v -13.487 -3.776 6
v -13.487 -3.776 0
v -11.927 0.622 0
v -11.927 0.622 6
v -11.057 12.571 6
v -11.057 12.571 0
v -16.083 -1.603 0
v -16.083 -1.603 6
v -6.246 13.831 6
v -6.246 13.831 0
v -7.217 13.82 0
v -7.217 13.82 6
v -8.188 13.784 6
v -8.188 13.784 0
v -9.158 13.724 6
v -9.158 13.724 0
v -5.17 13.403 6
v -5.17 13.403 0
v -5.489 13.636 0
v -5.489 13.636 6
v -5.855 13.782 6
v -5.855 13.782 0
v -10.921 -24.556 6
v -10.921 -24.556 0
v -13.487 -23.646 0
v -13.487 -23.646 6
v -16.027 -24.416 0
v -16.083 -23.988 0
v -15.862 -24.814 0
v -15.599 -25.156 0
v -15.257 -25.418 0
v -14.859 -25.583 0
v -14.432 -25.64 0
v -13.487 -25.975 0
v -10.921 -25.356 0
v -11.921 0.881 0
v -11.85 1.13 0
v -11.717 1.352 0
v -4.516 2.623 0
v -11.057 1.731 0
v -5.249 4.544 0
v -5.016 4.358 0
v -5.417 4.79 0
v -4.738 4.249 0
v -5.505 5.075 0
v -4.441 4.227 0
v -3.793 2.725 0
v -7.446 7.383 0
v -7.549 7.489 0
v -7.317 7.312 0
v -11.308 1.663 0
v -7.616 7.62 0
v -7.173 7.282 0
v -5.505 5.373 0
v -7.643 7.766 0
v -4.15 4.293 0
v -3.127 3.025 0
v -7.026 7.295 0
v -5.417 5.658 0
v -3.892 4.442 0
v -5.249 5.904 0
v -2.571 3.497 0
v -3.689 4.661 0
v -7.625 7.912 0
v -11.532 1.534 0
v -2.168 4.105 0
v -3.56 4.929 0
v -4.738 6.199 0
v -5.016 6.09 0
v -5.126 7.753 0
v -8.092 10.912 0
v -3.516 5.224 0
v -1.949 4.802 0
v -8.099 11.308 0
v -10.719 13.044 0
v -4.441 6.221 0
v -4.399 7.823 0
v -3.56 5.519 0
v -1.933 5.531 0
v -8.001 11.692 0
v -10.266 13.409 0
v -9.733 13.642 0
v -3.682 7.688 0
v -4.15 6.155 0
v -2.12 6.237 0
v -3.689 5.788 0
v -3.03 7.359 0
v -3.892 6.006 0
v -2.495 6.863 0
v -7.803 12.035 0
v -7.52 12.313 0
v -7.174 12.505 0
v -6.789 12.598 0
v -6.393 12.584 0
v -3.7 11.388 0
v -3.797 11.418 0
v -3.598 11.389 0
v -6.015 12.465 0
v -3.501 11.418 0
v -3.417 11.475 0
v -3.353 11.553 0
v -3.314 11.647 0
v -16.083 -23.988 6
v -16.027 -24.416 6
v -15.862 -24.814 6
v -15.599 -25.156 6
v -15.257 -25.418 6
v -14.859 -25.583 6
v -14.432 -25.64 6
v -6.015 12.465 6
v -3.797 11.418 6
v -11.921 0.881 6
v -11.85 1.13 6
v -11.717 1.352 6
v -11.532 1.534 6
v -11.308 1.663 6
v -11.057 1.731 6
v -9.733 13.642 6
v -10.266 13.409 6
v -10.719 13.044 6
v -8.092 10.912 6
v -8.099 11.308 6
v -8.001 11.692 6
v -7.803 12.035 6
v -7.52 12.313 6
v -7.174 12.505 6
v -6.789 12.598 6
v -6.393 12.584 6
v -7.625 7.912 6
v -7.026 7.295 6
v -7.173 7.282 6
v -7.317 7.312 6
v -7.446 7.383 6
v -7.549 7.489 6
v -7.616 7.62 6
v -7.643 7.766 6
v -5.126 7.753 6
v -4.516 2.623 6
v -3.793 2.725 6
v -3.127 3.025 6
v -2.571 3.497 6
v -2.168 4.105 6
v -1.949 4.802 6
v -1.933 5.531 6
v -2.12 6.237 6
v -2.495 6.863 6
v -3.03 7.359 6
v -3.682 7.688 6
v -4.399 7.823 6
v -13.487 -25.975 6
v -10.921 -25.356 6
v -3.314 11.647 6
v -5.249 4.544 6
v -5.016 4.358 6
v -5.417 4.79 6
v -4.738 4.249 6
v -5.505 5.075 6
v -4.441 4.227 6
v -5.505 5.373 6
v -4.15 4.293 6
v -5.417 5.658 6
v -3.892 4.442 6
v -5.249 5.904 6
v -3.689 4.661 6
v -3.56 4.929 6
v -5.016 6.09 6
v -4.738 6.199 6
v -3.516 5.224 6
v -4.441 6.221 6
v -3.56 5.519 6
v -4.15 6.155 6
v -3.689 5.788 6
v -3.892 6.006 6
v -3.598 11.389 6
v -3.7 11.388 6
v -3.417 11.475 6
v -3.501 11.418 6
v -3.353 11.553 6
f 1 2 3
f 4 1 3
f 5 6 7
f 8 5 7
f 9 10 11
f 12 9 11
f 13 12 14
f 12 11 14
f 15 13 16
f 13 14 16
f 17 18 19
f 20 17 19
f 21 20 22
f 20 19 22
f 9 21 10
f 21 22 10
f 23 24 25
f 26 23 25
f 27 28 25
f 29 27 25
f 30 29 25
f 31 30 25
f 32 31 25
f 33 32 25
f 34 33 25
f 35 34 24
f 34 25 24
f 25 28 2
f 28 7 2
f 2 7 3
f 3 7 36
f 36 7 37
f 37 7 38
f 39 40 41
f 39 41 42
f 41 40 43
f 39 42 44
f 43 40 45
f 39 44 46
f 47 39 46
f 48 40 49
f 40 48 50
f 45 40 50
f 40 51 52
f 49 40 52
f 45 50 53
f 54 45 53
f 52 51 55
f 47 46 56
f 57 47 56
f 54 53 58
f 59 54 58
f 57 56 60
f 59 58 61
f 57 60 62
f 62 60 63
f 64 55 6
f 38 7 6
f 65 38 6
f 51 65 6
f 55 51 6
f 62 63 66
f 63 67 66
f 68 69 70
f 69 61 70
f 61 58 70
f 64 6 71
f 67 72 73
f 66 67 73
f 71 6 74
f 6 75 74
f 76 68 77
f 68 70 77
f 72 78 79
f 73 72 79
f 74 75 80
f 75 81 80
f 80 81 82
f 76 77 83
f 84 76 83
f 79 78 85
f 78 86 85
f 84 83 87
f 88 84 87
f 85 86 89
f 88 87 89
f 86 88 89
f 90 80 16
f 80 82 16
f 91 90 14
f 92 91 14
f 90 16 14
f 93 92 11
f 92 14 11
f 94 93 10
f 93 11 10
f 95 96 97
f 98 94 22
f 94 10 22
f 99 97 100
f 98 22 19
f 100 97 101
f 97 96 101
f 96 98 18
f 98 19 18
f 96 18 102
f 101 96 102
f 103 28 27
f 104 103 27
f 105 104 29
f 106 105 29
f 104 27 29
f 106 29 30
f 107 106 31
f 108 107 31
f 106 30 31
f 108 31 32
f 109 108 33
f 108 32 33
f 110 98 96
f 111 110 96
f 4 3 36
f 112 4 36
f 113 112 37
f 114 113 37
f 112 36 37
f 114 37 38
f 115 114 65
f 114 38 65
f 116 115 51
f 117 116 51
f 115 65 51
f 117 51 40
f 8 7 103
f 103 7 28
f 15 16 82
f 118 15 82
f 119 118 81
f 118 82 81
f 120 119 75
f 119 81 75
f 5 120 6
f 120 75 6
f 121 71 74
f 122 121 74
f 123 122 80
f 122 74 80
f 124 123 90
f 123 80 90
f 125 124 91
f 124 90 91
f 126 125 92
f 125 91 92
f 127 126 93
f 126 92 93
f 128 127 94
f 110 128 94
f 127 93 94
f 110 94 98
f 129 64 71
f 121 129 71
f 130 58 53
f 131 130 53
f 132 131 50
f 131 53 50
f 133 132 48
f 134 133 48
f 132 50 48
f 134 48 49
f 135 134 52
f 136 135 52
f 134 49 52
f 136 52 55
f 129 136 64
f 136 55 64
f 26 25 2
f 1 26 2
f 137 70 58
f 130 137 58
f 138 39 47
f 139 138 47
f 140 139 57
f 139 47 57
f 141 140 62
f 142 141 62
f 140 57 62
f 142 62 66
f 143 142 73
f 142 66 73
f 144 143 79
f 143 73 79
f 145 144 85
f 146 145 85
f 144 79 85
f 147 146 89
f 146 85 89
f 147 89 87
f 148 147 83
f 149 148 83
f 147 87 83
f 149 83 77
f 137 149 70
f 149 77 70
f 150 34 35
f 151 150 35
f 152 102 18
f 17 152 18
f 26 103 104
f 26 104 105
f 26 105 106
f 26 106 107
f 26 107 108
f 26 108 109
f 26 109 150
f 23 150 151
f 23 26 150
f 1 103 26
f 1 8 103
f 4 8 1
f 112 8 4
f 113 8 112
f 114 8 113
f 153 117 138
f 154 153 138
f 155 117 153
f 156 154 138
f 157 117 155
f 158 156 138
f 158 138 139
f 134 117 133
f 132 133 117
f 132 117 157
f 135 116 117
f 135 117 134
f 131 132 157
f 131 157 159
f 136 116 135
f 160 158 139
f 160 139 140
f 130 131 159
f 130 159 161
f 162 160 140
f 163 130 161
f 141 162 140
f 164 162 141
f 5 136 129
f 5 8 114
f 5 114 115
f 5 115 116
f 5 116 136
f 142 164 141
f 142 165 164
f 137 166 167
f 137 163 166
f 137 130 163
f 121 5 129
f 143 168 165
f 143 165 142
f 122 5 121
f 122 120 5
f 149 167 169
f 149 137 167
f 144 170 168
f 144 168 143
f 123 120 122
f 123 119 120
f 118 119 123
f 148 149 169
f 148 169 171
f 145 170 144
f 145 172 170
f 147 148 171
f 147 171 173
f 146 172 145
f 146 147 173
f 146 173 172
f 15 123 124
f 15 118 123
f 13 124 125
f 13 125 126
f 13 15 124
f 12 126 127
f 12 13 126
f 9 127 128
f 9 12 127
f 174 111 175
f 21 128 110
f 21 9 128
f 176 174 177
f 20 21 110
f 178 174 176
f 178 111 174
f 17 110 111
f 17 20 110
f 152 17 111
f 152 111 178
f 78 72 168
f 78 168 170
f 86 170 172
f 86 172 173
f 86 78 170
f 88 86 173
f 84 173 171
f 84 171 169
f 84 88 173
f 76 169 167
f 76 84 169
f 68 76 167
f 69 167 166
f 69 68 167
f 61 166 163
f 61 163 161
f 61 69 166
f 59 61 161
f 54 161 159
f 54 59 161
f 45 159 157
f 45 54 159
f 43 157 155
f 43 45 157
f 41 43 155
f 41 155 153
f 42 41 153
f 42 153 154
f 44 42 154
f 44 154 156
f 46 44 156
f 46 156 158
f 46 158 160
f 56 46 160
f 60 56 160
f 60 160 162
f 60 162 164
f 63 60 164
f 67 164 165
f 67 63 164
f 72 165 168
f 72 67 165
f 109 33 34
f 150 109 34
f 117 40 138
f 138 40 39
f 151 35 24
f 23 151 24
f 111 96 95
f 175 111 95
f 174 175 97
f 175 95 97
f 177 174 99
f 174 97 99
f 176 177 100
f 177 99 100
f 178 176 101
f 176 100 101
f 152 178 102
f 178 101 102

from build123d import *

# Parameters (mm, degrees)
ESQUISSE1_R        = 1
BOSS_EXTRU_1_DEPTH = 6


with BuildPart() as part:
    # Esquisse1 → Boss.-Extru.1 (new body)
    with BuildSketch(Plane.XY):
        with BuildLine():
            Line((-5.125601059, 7.752865214), (-7.025601059, 7.294584696))
            ThreePointArc((-7.025601059, 7.294584696), (-7.501583822, 7.432360963), (-7.625219148, 7.912211144))
            Line((-7.625219148, 7.912211144), (-8.091799231, 10.912211144))
            ThreePointArc((-8.091799231, 10.912211144), (-7.52044361, 12.313188257), (-6.015074536, 12.46500415))
            Line((-6.015074536, 12.46500415), (-3.79657697, 11.417824019))
            ThreePointArc((-3.79657697, 11.417824019), (-3.501096688, 11.418143301), (-3.314034571, 11.646871225))
            Line((-3.314034571, 11.646871225), (-5.170456982, 13.403293241))
            ThreePointArc((-5.170456982, 13.403293241), (-5.667222651, 13.720510456), (-6.246087907, 13.831496523))
            ThreePointArc((-6.246087907, 13.831496523), (-7.702827431, 13.804605734), (-9.157582062, 13.723970009))
            ThreePointArc((-9.157582062, 13.723970009), (-10.266440997, 13.409307705), (-11.057492389, 12.570965175))
            Line((-11.057492389, 12.570965175), (-16.083035607, -1.602809651))
            Line((-16.083035607, -1.602809651), (-16.083035607, -23.988240086))
            ThreePointArc((-16.083035607, -23.988240086), (-15.599388885, -25.155866561), (-14.43176241, -25.639513283))
            Line((-14.43176241, -25.639513283), (-13.486808234, -25.97456221))
            Line((-13.486808234, -25.97456221), (-10.920669924, -25.35560895))
            Line((-10.920669924, -25.35560895), (-10.920669924, -24.556164823))
            Line((-10.920669924, -24.556164823), (-13.486808234, -23.646298599))
            Line((-13.486808234, -23.646298599), (-13.486808234, -3.776370077))
            Line((-13.486808234, -3.776370077), (-11.927338138, 0.621876447))
            ThreePointArc((-11.927338138, 0.621876447), (-11.717055765, 1.352491988), (-11.057492389, 1.73063733))
            Line((-11.057492389, 1.73063733), (-4.515694846, 2.623090489))
            ThreePointArc((-4.515694846, 2.623090489), (-1.932742353, 5.531336315), (-5.125601059, 7.752865214))
        make_face()
        with Locations((-4.515694846, 5.224235349)):
            Circle(ESQUISSE1_R, mode=Mode.SUBTRACT)
    extrude(amount=BOSS_EXTRU_1_DEPTH)


solid = part.part
